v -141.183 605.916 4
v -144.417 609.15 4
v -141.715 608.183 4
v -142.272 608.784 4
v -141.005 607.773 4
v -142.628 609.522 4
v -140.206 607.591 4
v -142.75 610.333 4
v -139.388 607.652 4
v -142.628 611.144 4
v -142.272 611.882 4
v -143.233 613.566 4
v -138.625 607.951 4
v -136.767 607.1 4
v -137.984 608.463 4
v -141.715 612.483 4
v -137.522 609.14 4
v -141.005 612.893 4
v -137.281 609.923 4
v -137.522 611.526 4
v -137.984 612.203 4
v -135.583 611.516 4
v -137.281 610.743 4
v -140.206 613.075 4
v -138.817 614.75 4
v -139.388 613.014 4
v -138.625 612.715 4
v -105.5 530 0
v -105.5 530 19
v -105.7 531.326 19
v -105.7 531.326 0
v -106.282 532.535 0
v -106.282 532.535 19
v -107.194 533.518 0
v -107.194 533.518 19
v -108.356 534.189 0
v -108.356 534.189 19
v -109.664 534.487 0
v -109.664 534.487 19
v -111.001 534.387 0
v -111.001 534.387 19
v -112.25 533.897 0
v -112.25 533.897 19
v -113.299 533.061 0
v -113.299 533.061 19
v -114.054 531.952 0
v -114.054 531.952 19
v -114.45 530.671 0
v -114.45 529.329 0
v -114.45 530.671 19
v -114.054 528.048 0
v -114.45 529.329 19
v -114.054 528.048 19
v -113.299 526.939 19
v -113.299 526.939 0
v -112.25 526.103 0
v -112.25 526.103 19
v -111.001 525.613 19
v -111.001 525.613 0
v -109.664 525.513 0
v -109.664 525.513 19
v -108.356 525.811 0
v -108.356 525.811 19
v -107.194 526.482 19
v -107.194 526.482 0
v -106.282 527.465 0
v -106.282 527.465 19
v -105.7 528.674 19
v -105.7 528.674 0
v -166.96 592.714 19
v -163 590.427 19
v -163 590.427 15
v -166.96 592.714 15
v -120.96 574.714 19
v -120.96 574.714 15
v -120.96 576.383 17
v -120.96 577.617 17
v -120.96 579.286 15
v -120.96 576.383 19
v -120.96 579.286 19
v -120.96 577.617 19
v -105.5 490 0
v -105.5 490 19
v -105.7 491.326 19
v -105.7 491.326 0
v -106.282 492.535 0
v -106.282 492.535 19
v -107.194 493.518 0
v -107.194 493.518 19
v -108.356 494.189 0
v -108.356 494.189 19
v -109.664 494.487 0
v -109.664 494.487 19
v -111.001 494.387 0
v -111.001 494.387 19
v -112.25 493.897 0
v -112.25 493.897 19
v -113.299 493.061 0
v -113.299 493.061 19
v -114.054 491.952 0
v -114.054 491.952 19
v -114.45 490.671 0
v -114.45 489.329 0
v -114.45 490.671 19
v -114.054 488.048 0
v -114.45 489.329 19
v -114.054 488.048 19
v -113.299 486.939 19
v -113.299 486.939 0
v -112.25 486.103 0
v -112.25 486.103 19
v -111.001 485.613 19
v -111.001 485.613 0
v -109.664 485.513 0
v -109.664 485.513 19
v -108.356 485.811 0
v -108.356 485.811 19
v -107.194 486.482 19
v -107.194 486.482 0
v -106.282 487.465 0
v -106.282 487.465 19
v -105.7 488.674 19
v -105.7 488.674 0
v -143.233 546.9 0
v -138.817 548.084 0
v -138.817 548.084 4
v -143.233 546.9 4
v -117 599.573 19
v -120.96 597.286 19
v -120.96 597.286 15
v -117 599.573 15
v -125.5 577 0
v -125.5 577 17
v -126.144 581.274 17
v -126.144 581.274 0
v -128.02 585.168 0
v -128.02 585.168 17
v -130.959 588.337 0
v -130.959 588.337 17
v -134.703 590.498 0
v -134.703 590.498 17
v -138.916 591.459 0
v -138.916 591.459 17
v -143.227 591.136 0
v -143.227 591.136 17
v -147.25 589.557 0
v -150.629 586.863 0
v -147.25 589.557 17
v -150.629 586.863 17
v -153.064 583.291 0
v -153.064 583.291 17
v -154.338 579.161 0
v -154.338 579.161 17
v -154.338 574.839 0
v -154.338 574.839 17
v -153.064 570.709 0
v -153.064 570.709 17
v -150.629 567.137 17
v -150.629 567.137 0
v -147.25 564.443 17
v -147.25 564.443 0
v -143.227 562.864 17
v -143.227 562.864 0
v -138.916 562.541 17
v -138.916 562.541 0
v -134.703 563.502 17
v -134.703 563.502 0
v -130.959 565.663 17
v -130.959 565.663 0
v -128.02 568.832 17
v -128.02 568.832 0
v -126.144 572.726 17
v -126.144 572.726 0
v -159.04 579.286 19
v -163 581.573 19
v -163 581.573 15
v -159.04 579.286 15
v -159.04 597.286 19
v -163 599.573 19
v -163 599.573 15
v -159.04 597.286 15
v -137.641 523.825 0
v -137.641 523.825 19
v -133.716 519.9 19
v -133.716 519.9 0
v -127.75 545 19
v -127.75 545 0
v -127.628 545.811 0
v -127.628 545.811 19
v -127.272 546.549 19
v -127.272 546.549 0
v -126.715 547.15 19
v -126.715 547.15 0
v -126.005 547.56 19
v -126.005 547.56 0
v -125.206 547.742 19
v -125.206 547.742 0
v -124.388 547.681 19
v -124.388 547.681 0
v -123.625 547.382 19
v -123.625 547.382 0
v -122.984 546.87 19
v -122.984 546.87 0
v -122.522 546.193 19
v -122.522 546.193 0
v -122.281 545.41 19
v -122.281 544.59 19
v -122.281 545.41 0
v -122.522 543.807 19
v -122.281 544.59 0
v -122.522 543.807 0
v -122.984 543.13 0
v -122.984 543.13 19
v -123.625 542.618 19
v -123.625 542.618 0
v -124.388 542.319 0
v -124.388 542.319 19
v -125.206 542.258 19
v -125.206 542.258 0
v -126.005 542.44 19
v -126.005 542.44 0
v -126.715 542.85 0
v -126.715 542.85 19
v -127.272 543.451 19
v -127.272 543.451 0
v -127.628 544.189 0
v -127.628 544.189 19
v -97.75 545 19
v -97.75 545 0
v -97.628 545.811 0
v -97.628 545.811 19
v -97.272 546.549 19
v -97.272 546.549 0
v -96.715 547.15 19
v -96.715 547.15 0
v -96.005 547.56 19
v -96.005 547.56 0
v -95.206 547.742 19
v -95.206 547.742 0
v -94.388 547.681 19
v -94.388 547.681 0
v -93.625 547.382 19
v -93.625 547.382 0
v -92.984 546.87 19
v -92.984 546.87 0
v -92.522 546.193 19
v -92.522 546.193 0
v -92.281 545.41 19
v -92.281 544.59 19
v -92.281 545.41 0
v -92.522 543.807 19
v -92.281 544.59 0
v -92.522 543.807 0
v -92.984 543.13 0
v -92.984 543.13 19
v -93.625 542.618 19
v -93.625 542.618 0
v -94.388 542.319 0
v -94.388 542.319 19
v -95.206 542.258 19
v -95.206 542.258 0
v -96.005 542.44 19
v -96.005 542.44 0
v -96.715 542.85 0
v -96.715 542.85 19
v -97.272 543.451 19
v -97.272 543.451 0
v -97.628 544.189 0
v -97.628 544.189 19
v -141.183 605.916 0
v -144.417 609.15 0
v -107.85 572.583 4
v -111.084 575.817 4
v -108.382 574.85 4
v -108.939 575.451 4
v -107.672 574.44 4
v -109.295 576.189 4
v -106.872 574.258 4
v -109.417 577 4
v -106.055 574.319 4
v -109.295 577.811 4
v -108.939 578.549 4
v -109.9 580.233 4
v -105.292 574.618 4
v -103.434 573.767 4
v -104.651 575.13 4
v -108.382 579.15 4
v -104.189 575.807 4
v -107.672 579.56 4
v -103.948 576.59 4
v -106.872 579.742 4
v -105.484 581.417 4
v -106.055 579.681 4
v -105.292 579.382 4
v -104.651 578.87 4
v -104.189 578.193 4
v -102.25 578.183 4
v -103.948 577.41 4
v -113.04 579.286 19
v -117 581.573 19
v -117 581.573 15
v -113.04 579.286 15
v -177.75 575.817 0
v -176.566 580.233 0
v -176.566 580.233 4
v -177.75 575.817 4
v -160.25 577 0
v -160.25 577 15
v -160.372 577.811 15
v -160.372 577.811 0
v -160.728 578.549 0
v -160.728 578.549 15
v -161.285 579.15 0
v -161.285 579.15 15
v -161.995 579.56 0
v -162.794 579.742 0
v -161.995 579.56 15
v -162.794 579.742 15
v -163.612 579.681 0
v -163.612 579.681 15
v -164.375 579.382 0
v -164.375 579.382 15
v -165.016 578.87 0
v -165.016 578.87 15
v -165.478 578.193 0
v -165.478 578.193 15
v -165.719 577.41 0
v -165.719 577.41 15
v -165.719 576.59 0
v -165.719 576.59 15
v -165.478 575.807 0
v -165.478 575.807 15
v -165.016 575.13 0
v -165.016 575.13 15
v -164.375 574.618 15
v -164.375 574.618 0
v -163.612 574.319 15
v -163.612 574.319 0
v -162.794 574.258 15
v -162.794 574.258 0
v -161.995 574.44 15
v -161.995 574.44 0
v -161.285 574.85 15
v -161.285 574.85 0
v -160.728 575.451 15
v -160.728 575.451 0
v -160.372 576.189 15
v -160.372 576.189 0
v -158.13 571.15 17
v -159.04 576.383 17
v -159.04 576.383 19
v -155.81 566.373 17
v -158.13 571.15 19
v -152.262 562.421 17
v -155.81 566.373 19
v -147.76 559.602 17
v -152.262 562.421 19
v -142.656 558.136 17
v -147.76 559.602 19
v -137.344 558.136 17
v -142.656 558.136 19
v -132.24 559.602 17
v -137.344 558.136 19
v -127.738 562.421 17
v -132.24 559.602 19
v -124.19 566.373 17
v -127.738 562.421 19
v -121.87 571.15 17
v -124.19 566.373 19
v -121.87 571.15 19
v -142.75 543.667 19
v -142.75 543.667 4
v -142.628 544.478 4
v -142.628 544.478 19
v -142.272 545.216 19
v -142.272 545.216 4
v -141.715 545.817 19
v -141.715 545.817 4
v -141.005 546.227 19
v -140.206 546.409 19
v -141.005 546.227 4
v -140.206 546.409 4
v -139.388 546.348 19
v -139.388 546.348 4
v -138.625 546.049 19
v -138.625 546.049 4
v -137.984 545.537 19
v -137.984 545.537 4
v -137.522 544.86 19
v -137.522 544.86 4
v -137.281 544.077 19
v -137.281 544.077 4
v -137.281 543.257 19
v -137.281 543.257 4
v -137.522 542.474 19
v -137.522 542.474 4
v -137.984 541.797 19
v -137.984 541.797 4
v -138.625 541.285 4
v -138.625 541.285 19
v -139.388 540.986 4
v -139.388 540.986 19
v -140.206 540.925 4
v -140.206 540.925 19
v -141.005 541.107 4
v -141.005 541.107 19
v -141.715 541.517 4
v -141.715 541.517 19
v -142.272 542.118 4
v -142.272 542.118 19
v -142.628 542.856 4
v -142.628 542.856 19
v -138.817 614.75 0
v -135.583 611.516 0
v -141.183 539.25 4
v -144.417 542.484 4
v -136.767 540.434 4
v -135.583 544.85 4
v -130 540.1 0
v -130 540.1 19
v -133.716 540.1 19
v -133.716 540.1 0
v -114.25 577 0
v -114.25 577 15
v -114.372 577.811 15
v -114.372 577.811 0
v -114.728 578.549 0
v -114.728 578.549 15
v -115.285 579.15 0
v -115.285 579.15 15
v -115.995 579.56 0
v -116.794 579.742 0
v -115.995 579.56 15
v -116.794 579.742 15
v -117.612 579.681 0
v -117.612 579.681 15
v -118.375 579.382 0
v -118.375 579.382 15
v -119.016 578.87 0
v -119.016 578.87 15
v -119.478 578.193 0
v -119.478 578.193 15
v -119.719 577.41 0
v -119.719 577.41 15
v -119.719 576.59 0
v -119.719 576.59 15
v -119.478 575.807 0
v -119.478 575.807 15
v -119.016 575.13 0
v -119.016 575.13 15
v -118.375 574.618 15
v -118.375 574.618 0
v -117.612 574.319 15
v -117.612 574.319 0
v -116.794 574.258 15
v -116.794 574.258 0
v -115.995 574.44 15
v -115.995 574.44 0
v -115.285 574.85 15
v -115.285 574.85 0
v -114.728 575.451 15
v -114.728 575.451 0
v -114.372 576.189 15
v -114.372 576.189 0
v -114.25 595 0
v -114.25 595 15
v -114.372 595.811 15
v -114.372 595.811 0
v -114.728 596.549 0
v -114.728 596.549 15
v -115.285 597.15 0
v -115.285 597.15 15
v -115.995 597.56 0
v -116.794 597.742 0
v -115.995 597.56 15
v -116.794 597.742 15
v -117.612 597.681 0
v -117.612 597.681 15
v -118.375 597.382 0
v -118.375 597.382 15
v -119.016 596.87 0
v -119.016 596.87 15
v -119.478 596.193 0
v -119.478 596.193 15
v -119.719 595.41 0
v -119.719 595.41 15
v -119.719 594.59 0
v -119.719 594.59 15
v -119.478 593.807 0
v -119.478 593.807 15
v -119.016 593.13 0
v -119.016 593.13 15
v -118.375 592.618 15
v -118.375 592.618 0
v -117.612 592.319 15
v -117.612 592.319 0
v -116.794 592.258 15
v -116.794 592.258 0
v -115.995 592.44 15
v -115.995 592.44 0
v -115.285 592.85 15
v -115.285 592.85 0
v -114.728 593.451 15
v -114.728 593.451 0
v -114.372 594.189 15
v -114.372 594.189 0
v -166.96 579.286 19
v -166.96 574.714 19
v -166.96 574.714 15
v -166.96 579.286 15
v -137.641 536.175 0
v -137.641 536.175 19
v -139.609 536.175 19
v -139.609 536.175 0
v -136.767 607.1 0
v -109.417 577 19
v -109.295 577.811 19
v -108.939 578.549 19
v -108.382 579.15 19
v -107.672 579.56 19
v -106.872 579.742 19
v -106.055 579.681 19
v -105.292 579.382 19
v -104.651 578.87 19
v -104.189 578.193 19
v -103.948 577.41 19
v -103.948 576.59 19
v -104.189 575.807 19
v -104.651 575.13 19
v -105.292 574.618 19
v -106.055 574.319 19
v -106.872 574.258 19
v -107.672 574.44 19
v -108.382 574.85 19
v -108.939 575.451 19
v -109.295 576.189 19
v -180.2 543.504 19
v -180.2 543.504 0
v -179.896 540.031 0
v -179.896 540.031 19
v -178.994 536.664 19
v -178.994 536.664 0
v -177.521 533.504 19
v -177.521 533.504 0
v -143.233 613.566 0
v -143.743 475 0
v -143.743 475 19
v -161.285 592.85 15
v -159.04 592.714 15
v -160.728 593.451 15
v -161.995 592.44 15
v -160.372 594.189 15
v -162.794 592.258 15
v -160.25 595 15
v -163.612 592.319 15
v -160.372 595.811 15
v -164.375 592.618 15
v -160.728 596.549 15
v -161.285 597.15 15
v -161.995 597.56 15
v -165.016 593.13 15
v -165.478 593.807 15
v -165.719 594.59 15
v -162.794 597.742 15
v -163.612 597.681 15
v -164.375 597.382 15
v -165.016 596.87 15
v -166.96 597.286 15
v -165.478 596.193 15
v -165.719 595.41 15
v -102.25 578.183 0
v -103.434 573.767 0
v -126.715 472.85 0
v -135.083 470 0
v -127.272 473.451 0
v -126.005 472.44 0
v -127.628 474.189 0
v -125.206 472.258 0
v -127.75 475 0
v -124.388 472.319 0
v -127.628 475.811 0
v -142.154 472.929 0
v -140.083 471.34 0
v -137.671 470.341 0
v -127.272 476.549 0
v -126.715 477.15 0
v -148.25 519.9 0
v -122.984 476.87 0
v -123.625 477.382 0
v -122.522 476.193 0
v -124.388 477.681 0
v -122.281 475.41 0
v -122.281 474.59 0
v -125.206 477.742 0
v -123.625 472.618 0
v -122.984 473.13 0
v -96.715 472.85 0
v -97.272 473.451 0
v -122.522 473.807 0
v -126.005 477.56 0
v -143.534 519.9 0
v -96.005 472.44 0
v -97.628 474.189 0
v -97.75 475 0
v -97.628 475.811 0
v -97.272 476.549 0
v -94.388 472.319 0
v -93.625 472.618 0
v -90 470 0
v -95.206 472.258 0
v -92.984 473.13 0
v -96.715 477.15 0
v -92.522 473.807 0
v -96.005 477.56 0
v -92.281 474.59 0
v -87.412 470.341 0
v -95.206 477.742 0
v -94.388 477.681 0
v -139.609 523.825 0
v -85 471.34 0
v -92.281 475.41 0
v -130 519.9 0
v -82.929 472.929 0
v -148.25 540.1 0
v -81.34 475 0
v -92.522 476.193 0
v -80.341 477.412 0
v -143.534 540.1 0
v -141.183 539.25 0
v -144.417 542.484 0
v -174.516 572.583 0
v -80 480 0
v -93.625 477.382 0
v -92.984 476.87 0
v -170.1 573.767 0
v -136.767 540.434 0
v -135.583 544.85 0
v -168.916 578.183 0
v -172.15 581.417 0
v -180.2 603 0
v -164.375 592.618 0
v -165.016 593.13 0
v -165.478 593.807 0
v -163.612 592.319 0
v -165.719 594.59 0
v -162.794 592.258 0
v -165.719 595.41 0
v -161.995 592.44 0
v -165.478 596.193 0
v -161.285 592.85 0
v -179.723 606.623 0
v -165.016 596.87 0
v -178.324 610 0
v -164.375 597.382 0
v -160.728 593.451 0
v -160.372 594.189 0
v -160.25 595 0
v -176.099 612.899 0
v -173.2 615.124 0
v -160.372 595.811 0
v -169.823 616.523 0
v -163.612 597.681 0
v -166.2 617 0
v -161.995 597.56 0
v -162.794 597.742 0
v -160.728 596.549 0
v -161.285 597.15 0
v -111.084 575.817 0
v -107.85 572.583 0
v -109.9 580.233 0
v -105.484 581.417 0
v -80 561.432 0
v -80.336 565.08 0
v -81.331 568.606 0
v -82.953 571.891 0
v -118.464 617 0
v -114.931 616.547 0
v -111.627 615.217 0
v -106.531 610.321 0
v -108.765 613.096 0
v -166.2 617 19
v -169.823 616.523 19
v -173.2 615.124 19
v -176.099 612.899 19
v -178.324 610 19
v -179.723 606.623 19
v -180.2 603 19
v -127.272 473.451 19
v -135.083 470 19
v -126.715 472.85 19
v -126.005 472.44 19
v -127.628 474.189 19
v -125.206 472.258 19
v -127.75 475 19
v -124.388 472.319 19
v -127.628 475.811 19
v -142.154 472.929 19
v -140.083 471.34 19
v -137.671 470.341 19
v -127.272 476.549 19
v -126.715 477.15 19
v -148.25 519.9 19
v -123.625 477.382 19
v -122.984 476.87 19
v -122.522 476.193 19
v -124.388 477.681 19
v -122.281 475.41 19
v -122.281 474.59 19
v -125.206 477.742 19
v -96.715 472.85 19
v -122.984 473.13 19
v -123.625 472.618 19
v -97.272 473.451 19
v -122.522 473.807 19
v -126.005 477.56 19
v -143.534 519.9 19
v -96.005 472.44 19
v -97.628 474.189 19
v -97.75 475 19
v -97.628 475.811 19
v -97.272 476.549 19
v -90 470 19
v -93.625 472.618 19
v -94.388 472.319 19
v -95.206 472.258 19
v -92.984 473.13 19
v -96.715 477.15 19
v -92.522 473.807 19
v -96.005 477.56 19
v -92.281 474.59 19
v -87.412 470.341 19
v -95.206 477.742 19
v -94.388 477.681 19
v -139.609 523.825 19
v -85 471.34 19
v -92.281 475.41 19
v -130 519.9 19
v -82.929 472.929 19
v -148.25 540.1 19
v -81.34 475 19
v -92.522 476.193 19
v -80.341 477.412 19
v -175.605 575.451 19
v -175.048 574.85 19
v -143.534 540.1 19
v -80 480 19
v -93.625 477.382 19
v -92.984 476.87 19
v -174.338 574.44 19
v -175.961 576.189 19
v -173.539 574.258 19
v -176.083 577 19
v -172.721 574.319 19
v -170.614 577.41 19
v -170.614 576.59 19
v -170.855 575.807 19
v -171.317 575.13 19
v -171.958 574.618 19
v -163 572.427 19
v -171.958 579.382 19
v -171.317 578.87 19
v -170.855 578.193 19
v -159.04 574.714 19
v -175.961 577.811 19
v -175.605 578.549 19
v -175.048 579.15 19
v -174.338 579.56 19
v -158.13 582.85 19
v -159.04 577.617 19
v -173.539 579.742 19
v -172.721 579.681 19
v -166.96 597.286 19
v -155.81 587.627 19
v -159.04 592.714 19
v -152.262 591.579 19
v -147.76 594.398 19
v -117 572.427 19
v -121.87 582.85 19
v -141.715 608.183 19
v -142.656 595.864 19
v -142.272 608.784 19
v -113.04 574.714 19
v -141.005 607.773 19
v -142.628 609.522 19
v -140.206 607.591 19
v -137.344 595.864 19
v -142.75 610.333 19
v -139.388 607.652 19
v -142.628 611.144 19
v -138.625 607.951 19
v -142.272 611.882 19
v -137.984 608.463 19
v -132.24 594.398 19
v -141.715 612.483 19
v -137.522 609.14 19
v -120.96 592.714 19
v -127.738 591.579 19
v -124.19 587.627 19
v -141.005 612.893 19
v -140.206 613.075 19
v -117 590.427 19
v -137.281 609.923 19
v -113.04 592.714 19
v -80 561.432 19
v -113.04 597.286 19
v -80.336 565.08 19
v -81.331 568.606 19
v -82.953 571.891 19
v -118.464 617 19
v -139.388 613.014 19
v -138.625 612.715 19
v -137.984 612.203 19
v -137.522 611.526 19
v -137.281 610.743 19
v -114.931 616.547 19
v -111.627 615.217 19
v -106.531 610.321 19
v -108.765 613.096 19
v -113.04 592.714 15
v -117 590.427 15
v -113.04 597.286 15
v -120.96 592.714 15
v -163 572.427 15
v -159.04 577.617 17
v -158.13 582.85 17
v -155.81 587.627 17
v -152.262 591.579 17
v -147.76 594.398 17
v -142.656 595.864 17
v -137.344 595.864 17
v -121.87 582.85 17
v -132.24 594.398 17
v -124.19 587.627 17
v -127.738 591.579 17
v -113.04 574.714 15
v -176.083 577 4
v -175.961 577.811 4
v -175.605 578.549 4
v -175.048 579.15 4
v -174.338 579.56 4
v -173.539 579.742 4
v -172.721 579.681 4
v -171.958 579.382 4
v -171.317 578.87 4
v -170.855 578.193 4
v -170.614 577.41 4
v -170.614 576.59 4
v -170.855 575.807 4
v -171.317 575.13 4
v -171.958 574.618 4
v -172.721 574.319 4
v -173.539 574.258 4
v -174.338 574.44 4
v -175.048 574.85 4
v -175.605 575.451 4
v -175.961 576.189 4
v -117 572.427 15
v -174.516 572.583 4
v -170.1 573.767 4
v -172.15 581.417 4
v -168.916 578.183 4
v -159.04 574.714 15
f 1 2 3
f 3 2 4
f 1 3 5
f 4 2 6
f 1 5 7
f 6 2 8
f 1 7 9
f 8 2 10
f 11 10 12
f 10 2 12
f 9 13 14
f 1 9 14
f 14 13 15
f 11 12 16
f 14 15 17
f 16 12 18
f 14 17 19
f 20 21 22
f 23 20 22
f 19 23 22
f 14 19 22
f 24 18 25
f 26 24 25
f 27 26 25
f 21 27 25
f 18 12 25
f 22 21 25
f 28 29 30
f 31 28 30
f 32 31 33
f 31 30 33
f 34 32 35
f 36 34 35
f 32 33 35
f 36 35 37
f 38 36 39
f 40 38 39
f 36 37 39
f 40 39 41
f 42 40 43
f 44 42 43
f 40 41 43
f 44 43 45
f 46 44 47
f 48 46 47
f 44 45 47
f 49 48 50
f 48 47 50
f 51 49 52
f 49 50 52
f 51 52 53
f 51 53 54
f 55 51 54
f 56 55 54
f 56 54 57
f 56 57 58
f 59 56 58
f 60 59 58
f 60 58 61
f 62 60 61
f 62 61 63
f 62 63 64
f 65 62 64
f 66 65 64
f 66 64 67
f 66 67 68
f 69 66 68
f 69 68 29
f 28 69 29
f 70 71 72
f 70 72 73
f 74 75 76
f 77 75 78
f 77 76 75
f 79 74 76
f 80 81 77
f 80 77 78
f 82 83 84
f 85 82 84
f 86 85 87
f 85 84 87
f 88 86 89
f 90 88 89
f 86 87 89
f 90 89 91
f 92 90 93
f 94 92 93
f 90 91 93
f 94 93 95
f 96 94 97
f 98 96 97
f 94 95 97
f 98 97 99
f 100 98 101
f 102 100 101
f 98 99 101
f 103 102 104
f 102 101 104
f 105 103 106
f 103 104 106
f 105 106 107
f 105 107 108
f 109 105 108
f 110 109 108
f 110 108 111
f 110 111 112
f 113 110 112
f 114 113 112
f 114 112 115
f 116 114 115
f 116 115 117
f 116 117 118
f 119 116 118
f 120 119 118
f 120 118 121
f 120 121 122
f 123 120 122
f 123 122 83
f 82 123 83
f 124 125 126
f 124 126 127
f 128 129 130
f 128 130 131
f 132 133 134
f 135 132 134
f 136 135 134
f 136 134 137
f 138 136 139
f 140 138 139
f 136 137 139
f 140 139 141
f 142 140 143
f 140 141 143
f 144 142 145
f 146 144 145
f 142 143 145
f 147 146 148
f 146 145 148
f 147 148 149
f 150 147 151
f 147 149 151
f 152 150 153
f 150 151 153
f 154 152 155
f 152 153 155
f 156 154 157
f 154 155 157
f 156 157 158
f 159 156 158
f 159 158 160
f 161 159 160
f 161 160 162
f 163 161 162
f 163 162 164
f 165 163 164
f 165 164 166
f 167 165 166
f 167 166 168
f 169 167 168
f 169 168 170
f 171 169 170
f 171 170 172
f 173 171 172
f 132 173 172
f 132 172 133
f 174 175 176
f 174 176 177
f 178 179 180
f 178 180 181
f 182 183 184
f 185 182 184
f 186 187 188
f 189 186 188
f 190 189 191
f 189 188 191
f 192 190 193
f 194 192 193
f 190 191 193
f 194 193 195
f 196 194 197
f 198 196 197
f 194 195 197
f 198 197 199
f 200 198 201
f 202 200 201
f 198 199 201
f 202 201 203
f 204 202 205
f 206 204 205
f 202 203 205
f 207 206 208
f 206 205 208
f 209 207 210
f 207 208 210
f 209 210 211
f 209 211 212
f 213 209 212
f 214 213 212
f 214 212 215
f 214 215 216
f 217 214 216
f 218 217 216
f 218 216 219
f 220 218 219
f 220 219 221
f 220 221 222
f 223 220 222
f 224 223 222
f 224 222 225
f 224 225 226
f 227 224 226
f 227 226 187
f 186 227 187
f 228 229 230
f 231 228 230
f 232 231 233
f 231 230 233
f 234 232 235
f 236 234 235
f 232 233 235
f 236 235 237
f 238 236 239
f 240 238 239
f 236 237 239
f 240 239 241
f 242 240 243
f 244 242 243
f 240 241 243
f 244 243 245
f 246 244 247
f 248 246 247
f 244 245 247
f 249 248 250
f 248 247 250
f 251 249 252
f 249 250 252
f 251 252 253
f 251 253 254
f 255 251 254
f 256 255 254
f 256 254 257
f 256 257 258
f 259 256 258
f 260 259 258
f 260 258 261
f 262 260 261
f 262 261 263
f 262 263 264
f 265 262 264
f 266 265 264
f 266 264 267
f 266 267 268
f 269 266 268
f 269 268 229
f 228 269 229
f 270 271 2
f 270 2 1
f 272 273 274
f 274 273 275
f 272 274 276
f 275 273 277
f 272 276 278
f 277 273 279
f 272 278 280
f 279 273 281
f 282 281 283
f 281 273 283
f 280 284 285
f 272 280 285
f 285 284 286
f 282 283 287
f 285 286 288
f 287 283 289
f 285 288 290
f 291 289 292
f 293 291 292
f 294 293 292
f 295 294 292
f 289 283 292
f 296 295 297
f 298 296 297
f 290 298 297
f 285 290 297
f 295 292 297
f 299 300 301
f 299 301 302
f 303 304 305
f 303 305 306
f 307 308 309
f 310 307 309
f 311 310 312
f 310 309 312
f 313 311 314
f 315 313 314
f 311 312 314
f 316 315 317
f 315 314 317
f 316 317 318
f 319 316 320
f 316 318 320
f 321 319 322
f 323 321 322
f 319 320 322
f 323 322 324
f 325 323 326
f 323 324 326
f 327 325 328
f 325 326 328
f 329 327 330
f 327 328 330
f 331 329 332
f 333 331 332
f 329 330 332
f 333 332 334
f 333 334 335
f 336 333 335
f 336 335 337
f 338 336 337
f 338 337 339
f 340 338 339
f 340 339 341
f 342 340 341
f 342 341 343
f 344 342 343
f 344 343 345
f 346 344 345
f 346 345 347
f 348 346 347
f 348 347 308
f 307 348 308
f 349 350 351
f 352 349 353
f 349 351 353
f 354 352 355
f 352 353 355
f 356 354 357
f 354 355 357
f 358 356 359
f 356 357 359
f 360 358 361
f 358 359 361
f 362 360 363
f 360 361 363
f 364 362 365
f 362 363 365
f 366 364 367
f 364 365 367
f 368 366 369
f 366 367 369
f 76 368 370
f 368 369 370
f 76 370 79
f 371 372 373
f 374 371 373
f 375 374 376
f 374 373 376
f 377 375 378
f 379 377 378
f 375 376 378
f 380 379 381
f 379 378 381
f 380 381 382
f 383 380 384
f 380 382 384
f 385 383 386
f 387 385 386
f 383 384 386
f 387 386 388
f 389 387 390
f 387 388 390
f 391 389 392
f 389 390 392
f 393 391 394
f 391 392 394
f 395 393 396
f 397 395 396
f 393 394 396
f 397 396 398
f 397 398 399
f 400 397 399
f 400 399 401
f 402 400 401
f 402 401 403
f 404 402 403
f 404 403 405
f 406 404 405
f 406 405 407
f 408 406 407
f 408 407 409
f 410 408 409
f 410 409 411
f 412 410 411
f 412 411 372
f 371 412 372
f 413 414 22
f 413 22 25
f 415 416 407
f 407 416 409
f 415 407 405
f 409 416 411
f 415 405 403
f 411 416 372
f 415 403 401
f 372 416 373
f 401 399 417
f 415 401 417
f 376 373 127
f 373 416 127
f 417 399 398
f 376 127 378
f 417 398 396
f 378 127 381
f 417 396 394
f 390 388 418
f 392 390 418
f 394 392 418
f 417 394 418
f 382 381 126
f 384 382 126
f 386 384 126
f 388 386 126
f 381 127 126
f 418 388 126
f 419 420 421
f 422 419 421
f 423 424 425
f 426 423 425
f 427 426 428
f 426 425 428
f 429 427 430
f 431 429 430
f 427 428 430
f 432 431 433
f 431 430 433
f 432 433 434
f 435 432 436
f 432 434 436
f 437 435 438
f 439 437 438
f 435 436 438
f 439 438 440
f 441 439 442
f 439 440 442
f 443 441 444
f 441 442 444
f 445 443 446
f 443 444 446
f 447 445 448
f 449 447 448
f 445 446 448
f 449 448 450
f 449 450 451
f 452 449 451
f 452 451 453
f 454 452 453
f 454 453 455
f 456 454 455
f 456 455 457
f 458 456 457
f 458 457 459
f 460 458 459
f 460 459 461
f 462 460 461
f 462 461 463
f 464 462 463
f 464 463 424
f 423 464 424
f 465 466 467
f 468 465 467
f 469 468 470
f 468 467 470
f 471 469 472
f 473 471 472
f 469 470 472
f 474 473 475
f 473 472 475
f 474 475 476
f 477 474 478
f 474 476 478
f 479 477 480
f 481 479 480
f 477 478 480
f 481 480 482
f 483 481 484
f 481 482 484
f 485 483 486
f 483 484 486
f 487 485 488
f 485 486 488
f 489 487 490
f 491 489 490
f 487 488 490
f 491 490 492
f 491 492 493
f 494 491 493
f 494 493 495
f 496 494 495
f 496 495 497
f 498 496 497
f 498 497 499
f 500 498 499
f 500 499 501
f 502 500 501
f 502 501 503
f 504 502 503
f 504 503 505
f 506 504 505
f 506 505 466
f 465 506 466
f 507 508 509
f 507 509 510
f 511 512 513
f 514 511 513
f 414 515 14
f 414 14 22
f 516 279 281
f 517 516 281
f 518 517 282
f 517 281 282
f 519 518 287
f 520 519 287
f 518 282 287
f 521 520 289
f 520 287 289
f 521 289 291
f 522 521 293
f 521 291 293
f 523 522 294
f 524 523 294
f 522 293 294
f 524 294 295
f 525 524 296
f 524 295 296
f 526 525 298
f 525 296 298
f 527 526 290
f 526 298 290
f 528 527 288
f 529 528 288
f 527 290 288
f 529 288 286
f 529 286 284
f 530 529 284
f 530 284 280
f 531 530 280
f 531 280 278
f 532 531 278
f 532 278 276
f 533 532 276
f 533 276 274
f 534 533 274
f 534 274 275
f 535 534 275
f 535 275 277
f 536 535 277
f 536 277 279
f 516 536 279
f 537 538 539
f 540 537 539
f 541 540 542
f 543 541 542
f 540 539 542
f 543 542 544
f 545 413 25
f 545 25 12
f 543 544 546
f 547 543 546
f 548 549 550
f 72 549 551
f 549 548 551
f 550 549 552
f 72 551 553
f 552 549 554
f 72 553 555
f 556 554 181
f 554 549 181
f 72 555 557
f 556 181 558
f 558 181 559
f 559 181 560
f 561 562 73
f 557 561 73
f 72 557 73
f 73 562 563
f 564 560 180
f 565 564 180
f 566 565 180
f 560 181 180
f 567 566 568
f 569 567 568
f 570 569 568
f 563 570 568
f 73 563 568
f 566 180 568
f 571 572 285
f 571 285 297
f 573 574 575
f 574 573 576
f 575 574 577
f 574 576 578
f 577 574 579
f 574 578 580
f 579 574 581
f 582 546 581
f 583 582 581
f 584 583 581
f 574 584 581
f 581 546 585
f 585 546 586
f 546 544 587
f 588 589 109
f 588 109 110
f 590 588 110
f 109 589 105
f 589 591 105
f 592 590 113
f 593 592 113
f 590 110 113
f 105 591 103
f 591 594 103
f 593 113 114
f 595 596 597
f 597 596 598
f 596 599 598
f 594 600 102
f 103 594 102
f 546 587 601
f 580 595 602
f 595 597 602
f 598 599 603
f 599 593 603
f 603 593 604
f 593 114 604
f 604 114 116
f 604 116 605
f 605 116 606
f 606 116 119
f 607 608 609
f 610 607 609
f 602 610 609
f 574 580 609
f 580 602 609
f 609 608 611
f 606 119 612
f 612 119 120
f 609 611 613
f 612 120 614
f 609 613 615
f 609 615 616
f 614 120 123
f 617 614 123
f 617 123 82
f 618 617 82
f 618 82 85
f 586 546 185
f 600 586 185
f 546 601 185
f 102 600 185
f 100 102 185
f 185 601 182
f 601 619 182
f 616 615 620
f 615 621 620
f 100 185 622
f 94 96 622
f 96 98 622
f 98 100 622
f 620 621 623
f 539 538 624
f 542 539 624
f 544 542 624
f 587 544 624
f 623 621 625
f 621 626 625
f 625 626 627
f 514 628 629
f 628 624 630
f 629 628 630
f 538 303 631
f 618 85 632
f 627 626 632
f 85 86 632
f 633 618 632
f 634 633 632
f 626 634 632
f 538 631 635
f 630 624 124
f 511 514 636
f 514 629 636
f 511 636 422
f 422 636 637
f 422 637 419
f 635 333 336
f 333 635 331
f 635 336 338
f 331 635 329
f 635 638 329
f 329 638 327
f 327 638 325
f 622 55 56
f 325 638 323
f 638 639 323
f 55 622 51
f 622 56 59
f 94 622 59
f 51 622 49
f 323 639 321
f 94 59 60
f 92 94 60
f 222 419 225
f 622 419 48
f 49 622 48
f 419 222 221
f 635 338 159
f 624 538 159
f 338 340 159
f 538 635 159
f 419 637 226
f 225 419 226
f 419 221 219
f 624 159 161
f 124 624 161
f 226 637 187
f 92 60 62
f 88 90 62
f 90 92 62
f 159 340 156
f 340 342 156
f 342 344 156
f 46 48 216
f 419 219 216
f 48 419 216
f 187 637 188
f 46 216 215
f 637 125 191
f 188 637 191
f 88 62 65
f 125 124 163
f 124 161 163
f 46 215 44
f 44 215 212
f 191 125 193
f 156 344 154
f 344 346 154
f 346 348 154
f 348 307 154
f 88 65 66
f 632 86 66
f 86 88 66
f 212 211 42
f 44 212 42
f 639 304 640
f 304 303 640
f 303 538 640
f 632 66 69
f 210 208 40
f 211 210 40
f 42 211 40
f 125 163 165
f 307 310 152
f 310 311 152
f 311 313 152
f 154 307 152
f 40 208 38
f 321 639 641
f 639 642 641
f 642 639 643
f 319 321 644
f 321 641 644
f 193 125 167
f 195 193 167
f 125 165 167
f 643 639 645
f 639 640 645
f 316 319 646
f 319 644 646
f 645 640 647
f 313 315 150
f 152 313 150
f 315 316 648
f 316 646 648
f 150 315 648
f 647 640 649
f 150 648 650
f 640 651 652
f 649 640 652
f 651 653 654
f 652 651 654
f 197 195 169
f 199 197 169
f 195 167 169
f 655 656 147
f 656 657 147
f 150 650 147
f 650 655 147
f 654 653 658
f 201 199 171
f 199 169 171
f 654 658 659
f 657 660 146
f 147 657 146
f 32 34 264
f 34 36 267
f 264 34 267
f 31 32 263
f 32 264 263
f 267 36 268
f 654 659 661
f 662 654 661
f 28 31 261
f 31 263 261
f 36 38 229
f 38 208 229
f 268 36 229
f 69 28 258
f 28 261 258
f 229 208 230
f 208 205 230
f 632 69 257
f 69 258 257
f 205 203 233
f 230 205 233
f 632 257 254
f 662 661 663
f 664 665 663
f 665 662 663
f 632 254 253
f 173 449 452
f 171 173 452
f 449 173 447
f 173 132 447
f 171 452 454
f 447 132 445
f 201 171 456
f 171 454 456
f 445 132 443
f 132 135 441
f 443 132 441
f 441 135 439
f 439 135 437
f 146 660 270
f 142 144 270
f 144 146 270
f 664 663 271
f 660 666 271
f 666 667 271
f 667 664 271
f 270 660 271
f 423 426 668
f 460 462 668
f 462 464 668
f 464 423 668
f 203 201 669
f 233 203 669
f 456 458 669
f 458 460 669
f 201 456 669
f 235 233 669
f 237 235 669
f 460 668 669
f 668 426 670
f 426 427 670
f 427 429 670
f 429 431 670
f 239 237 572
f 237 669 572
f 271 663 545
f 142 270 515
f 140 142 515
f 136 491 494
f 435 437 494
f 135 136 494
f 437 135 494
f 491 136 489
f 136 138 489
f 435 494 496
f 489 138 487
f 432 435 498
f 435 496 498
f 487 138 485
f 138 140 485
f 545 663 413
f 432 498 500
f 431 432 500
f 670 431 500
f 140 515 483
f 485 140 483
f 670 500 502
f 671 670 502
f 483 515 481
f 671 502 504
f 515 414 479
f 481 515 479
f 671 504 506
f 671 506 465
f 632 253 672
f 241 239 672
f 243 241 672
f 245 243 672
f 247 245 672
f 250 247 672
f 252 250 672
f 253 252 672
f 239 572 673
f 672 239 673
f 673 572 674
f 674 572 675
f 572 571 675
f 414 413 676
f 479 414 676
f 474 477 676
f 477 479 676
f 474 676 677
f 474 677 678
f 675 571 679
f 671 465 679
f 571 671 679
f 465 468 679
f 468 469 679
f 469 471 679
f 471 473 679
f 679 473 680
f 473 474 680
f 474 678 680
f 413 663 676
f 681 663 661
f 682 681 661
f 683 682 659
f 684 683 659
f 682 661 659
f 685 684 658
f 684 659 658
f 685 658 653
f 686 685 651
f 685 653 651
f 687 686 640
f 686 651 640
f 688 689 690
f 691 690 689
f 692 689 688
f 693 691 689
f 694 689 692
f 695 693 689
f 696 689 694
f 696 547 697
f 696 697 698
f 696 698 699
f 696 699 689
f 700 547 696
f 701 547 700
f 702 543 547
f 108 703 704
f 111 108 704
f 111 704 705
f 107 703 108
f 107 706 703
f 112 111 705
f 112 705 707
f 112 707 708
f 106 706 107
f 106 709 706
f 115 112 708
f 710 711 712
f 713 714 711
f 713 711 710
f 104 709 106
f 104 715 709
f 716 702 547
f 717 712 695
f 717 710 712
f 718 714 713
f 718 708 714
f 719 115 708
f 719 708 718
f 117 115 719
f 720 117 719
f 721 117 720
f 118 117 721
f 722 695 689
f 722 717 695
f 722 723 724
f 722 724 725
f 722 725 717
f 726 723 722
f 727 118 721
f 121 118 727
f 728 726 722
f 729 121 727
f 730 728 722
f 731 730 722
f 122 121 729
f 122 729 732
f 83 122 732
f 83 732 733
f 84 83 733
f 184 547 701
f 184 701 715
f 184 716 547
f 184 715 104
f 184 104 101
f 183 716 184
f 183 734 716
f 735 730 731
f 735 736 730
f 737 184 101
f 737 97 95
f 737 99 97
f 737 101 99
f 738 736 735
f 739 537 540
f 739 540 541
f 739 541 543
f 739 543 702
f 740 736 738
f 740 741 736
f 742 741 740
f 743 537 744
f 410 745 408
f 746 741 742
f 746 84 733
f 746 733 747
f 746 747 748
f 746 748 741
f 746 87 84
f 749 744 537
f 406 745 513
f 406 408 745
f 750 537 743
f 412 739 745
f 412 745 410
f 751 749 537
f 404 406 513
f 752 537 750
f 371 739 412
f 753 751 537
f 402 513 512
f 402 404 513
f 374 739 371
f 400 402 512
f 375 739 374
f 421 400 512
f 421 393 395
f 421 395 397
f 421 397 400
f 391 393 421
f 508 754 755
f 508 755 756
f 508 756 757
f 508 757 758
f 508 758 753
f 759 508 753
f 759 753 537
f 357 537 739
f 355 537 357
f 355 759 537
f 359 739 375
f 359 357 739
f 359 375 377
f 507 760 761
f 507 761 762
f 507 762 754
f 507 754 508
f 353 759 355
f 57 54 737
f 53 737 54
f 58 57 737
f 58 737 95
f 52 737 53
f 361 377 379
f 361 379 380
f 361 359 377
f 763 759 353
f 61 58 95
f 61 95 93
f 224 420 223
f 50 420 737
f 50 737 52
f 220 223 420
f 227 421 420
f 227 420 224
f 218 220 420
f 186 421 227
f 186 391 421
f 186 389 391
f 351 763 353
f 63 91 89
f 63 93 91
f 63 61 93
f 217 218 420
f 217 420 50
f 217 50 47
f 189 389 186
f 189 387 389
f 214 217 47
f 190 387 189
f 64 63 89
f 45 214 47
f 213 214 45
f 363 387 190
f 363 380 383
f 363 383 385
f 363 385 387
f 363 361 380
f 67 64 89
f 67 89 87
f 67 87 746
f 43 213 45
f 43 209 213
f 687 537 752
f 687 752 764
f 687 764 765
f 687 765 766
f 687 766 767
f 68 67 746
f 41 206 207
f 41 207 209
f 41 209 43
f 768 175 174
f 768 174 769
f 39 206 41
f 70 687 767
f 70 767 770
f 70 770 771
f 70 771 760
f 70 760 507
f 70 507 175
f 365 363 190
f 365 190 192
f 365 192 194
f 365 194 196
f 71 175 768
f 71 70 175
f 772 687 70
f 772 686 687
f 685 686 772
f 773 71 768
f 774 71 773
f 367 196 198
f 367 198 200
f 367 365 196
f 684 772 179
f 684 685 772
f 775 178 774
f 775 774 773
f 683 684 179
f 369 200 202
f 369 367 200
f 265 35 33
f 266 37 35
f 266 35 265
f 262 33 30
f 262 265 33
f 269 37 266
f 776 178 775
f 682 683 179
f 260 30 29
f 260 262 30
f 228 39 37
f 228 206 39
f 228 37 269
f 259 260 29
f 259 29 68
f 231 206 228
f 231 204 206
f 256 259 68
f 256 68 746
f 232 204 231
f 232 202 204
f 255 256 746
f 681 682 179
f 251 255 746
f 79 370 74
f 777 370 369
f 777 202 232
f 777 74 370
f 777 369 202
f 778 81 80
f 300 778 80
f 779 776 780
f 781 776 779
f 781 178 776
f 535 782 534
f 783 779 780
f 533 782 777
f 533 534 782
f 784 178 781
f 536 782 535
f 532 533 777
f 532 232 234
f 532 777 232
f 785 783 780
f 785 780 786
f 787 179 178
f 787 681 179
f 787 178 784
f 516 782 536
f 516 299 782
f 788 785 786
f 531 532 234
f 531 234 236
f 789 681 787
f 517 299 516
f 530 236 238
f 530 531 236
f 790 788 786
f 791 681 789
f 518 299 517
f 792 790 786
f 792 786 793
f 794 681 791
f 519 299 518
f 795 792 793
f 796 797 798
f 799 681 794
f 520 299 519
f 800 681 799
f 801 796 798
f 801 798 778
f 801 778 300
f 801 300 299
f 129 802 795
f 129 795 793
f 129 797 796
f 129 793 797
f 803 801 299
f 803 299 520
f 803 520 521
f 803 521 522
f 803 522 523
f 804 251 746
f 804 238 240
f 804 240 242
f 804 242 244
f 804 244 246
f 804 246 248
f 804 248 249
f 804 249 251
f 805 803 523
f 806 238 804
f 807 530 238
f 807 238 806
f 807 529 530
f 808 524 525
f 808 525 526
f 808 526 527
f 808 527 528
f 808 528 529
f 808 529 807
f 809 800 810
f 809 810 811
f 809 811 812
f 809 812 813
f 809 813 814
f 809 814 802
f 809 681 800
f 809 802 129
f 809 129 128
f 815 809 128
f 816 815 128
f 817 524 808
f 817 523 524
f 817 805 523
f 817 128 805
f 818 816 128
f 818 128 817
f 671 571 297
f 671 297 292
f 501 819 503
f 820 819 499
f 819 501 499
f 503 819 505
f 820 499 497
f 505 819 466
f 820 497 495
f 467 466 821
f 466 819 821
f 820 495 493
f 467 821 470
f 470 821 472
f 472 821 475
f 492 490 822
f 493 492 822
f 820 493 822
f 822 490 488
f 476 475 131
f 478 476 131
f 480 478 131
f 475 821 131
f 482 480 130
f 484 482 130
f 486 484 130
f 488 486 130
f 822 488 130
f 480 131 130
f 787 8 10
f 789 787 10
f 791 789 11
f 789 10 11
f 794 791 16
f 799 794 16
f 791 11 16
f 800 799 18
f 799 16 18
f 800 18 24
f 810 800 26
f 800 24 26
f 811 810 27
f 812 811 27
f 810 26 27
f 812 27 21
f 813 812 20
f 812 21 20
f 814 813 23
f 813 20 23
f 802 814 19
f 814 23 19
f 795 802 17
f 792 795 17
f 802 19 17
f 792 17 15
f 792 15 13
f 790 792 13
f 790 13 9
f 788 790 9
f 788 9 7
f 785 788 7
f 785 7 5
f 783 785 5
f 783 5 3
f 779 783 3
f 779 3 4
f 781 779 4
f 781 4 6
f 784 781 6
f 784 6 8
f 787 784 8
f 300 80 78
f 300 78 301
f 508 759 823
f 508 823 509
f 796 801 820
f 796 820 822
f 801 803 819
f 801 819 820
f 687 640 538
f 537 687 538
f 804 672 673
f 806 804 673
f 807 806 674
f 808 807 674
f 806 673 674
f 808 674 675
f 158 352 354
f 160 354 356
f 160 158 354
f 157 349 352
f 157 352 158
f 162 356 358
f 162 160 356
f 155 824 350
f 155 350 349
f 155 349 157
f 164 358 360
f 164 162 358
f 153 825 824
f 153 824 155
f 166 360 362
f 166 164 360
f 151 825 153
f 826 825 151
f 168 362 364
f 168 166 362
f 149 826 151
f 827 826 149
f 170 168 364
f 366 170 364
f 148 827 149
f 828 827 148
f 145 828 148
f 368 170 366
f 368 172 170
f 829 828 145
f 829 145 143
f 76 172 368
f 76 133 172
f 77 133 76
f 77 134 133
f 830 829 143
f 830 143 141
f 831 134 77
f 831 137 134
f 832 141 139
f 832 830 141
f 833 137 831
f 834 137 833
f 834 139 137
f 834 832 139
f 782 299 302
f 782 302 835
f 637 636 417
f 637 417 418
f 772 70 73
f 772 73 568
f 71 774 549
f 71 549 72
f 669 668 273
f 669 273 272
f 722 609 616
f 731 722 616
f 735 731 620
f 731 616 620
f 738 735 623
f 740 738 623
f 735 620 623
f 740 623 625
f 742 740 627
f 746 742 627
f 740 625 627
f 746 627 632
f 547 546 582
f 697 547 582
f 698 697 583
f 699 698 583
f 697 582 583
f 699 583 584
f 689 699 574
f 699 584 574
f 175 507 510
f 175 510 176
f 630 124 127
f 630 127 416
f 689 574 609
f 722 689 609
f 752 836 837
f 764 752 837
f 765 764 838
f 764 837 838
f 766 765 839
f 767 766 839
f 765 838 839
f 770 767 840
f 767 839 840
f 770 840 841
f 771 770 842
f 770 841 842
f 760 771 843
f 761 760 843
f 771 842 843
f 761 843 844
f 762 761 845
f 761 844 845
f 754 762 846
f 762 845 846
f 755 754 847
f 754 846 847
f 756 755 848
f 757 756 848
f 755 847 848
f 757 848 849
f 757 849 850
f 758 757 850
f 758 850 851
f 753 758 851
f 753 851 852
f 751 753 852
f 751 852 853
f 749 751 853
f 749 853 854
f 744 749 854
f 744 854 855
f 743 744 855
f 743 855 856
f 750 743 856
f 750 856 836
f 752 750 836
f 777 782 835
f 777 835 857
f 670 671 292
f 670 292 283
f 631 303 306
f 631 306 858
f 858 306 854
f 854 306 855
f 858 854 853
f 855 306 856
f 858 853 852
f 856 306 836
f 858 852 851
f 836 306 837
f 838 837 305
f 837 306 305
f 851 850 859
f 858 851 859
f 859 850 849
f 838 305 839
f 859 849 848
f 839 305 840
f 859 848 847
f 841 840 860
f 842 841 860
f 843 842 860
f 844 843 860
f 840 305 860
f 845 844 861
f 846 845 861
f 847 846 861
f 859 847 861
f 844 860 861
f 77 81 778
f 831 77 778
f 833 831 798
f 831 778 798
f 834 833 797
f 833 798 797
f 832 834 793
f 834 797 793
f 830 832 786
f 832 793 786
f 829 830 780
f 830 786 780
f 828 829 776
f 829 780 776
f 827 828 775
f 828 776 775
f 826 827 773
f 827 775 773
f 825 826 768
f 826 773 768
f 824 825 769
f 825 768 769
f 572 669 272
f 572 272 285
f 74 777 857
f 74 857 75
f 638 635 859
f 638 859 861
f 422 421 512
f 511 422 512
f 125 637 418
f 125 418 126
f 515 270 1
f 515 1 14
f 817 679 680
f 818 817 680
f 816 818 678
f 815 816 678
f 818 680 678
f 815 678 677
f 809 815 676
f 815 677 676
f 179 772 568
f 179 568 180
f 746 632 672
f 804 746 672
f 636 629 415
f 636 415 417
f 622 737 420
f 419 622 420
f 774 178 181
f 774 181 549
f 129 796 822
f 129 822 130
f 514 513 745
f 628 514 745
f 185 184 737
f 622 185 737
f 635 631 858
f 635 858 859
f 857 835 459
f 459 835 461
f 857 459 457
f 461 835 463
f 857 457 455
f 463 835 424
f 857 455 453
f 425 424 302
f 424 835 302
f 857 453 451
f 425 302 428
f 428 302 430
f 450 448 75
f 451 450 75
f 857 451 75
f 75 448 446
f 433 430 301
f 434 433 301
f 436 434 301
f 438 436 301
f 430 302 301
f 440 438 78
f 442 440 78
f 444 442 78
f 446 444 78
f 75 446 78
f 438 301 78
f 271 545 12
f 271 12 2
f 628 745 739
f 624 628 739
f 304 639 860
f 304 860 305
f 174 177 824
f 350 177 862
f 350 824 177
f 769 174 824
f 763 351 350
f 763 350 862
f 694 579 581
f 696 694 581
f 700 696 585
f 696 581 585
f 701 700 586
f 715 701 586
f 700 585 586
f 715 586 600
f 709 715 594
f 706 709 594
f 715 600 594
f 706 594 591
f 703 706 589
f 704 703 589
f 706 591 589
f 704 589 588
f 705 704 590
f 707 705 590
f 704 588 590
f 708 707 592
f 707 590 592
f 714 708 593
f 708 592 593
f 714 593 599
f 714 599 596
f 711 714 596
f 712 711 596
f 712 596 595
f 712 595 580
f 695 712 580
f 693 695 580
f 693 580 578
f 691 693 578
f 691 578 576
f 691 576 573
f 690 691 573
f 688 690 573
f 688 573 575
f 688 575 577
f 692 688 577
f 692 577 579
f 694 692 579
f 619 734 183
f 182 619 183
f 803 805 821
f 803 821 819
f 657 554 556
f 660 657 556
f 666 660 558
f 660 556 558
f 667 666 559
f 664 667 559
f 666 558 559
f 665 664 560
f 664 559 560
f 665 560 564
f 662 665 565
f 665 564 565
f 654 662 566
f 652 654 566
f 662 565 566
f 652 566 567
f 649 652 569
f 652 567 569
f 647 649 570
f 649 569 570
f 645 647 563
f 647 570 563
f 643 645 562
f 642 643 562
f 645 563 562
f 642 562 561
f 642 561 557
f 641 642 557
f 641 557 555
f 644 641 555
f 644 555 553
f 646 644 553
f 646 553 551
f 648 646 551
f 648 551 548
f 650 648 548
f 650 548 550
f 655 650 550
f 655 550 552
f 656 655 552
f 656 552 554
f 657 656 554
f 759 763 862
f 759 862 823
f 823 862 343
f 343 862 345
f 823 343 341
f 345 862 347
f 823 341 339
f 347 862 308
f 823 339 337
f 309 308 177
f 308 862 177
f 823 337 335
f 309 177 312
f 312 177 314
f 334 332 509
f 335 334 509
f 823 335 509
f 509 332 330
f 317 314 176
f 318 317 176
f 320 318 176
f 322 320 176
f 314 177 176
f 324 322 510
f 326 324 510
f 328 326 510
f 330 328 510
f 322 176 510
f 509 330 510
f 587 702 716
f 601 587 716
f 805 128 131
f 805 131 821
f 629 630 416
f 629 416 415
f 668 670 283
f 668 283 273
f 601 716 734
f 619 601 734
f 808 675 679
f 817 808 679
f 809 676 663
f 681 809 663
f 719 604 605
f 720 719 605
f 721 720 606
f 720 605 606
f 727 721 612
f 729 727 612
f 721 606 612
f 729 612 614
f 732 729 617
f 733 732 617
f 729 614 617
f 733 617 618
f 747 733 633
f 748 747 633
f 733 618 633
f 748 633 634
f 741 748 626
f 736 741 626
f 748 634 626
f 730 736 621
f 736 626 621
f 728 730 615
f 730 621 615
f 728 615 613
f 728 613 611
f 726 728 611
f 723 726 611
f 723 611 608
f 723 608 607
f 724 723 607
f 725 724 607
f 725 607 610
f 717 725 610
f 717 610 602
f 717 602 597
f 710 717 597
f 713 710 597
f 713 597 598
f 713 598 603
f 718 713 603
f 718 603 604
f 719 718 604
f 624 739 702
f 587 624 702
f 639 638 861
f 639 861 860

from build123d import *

# Parameters (mm, degrees)
BOSS_EXTRUDE1_DEPTH  = 19
FILLET1_R            = 10
BOSS_EXTRUDE2_DEPTH  = 19
SKETCH2_R            = 14.5
CUT_EXTRUDE1_DEPTH   = 20
M5_CLEARANCE_HOLE2_D = 5.5
M5_CLEARANCE_HOLE1_D = 5.5
M5_CLEARANCE_HOLE3_D = 5.5
M8_CLEARANCE_HOLE1_D = 9
CUT_EXTRUDE2_DEPTH   = 4
CUT_EXTRUDE3_DEPTH   = 4
SKETCH16_R           = 19.05
CUT_EXTRUDE4_DEPTH   = 2
CUT_EXTRUDE5_DEPTH   = 20


# Read off the part's stored shape, not the designer's step: Boss-Extrude2
with BuildPart() as part:
    # Sketch1 → Boss-Extrude1 (new body)
    with BuildSketch(Plane.XY):
        with BuildLine():
            Line((-170.200000001, 540.824594888), (-129.309401077, 470))
            Line((-129.309401077, 470), (-93, 470))
            ThreePointArc((-93, 470), (-90.878679656, 470.878679656), (-90, 473))
            Line((-90, 473), (-90, 564.25527297))
            Line((-90, 564.25527297), (-116.225329238, 607))
            Line((-116.225329238, 607), (-170.200000001, 607))
            Line((-170.200000001, 607), (-170.200000001, 540.824594888))
        make_face()
    extrude(amount=BOSS_EXTRUDE1_DEPTH)

    # Fillet1
    fillet1_edges = [part.edges().sort_by_distance(p)[0] for p in [
        (-90, 564.25527297, 9.5),
        (-129.309401077, 470, 9.5),
        (-170.200000001, 540.824594888, 9.5),
    ]]
    fillet(fillet1_edges, radius=FILLET1_R)

    # Boss-Extrude2 outline → Boss-Extrude2 (add)
    with BuildSketch(Plane.XY):
        with BuildLine():
            Line((-93, 470), (-90, 470))
            ThreePointArc((-90, 470), (-82.928932188, 472.928932188), (-80, 480))
            Line((-80, 480), (-80, 561.432106106))
            ThreePointArc((-80, 561.432106106), (-80.75234172, 566.866041212), (-82.952765074, 571.89115871))
            Line((-82.952765074, 571.89115871), (-106.530973281, 610.321336823))
            ThreePointArc((-106.530973281, 610.321336823), (-111.626593598, 615.216765438), (-118.464037729, 617))
            Line((-118.464037729, 617), (-166.200000001, 617))
            ThreePointArc((-166.200000001, 617), (-176.099494937, 612.899494936), (-180.200000001, 603))
            Line((-180.200000001, 603), (-180.200000001, 543.504086813))
            ThreePointArc((-180.200000001, 543.504086813), (-179.518516526, 538.327705911), (-177.520508076, 533.504086813))
            Line((-177.520508076, 533.504086813), (-143.743157806, 475))
            ThreePointArc((-143.743157806, 475), (-140.082903769, 471.339745962), (-135.082903769, 470))
            Line((-135.082903769, 470), (-123.535898385, 470))
            ThreePointArc((-123.535898385, 470), (-128.535898385, 471.339745962), (-132.196152423, 475))
            Line((-132.196152423, 475), (-168.860254039, 538.504086813))
            ThreePointArc((-168.860254039, 538.504086813), (-169.859258264, 540.915896362), (-170.200000001, 543.504086813))
            Line((-170.200000001, 543.504086813), (-170.200000001, 607))
            Line((-170.200000001, 607), (-116.225329238, 607))
            Line((-116.225329238, 607), (-91.476382537, 566.661632408))
            ThreePointArc((-91.476382537, 566.661632408), (-90.37617086, 564.149073659), (-90, 561.432106106))
            Line((-90, 561.432106106), (-90, 473))
            ThreePointArc((-90, 473), (-90.878679656, 470.878679656), (-93, 470))
        make_face()
    extrude(amount=BOSS_EXTRUDE2_DEPTH)

    # Sketch2 → Cut-Extrude1 (cut)
    with BuildSketch(Plane.XY.offset(19)):
        with Locations((-140, 577)):
            Circle(SKETCH2_R)
    extrude(amount=-CUT_EXTRUDE1_DEPTH, mode=Mode.SUBTRACT)

    # M5 Clearance Hole2 (through all)
    with Locations(Plane(origin=(0, 0, 0), x_dir=(-1, 0, 0), z_dir=(0, 0, -1))):
        with Locations((117.000000001, 595), (117.000000001, 577), (163.000000001, 577), (163.000000001, 595)):
            Hole(M5_CLEARANCE_HOLE2_D / 2)

    # M5 Clearance Hole1 (through all)
    with Locations(Plane.XY.offset(19)):
        with Locations((-95, 545), (-125, 545), (-125, 475), (-95, 475), (-110, 490), (-110, 530)):
            Hole(M5_CLEARANCE_HOLE1_D / 2)

    # M5 Clearance Hole3 (through all)
    with Locations(Plane.XY.offset(19)):
        with Locations((-140.000000001, 543.666986335), (-173.333013666, 577), (-106.666986336, 577), (-140.000000001, 610.333013665)):
            Hole(M5_CLEARANCE_HOLE3_D / 2)

    # M8 Clearance Hole1 (through all)
    with Locations(Plane(origin=(-110, 490, 0), x_dir=(-1, 0, 0), z_dir=(0, 0, -1))):
        with Locations((0, 0), (0, 40)):
            Hole(M8_CLEARANCE_HOLE1_D / 2)

    # Sketch14 → Cut-Extrude2 (cut)
    with BuildSketch(Plane(origin=(0, 0, 19), x_dir=(-1, 0, 0), z_dir=(0, 0, -1))):
        Polygon((117.000000001, 581.572614132), (113.04, 579.286307066), (113.04, 574.713692934), (117.000000001, 572.427385868), (120.960000001, 574.713692934), (120.960000001, 579.286307066), align=None)
        Polygon((163.000000001, 581.572614133), (159.04, 579.286307066), (159.04, 574.713692934), (163.000000001, 572.427385867), (166.960000001, 574.713692934), (166.960000001, 579.286307066), align=None)
        Polygon((163.000000001, 599.572614132), (159.040000001, 597.286307066), (159.040000001, 592.713692934), (163.000000001, 590.427385868), (166.960000001, 592.713692934), (166.960000001, 597.286307066), align=None)
        Polygon((120.960000001, 597.286307066), (117.000000001, 599.572614132), (113.040000001, 597.286307066), (113.040000001, 592.713692934), (117.000000001, 590.427385868), (120.960000001, 592.713692934), align=None)
    extrude(amount=CUT_EXTRUDE2_DEPTH, mode=Mode.SUBTRACT)

    # Sketch15 → Cut-Extrude3 (cut)
    with BuildSketch(Plane.XY):
        Polygon((-143.233326461, 546.900312795), (-144.416806085, 542.483506711), (-141.183479624, 539.25018025), (-136.76667354, 540.433659874), (-135.583193916, 544.850465958), (-138.816520377, 548.083792419), align=None)
        Polygon((-143.233326462, 613.566340126), (-144.416806085, 609.149534041), (-141.183479624, 605.91620758), (-136.76667354, 607.099687204), (-135.583193916, 611.516493288), (-138.816520377, 614.749819749), align=None)
        Polygon((-109.900312796, 580.23332646), (-111.083792419, 575.816520376), (-107.850465959, 572.583193916), (-103.433659875, 573.766673539), (-102.250180252, 578.183479623), (-105.483506712, 581.416806083), align=None)
        Polygon((-172.149534042, 581.416806083), (-176.566340126, 580.23332646), (-177.749819749, 575.816520376), (-174.516493289, 572.583193916), (-170.099687205, 573.766673539), (-168.916207582, 578.183479623), align=None)
    extrude(amount=CUT_EXTRUDE3_DEPTH, mode=Mode.SUBTRACT)

    # Sketch16 → Cut-Extrude4 (cut)
    with BuildSketch(Plane.XY.offset(19)):
        with Locations((-140, 577)):
            Circle(SKETCH16_R)
    extrude(amount=-CUT_EXTRUDE4_DEPTH, mode=Mode.SUBTRACT)

    # Sketch17 → Cut-Extrude5 (cut)
    with BuildSketch(Plane.XY.offset(19)):
        Polygon((-148.25, 540.1), (-148.25, 519.9), (-143.533578644, 519.9), (-139.608578644, 523.825), (-137.641421356, 523.825), (-133.716421356, 519.9), (-130, 519.9), (-130, 540.1), (-133.716421356, 540.1), (-137.641421356, 536.175), (-139.608578644, 536.175), (-143.533578644, 540.1), align=None)
    extrude(amount=-CUT_EXTRUDE5_DEPTH, mode=Mode.SUBTRACT)


solid = part.part
